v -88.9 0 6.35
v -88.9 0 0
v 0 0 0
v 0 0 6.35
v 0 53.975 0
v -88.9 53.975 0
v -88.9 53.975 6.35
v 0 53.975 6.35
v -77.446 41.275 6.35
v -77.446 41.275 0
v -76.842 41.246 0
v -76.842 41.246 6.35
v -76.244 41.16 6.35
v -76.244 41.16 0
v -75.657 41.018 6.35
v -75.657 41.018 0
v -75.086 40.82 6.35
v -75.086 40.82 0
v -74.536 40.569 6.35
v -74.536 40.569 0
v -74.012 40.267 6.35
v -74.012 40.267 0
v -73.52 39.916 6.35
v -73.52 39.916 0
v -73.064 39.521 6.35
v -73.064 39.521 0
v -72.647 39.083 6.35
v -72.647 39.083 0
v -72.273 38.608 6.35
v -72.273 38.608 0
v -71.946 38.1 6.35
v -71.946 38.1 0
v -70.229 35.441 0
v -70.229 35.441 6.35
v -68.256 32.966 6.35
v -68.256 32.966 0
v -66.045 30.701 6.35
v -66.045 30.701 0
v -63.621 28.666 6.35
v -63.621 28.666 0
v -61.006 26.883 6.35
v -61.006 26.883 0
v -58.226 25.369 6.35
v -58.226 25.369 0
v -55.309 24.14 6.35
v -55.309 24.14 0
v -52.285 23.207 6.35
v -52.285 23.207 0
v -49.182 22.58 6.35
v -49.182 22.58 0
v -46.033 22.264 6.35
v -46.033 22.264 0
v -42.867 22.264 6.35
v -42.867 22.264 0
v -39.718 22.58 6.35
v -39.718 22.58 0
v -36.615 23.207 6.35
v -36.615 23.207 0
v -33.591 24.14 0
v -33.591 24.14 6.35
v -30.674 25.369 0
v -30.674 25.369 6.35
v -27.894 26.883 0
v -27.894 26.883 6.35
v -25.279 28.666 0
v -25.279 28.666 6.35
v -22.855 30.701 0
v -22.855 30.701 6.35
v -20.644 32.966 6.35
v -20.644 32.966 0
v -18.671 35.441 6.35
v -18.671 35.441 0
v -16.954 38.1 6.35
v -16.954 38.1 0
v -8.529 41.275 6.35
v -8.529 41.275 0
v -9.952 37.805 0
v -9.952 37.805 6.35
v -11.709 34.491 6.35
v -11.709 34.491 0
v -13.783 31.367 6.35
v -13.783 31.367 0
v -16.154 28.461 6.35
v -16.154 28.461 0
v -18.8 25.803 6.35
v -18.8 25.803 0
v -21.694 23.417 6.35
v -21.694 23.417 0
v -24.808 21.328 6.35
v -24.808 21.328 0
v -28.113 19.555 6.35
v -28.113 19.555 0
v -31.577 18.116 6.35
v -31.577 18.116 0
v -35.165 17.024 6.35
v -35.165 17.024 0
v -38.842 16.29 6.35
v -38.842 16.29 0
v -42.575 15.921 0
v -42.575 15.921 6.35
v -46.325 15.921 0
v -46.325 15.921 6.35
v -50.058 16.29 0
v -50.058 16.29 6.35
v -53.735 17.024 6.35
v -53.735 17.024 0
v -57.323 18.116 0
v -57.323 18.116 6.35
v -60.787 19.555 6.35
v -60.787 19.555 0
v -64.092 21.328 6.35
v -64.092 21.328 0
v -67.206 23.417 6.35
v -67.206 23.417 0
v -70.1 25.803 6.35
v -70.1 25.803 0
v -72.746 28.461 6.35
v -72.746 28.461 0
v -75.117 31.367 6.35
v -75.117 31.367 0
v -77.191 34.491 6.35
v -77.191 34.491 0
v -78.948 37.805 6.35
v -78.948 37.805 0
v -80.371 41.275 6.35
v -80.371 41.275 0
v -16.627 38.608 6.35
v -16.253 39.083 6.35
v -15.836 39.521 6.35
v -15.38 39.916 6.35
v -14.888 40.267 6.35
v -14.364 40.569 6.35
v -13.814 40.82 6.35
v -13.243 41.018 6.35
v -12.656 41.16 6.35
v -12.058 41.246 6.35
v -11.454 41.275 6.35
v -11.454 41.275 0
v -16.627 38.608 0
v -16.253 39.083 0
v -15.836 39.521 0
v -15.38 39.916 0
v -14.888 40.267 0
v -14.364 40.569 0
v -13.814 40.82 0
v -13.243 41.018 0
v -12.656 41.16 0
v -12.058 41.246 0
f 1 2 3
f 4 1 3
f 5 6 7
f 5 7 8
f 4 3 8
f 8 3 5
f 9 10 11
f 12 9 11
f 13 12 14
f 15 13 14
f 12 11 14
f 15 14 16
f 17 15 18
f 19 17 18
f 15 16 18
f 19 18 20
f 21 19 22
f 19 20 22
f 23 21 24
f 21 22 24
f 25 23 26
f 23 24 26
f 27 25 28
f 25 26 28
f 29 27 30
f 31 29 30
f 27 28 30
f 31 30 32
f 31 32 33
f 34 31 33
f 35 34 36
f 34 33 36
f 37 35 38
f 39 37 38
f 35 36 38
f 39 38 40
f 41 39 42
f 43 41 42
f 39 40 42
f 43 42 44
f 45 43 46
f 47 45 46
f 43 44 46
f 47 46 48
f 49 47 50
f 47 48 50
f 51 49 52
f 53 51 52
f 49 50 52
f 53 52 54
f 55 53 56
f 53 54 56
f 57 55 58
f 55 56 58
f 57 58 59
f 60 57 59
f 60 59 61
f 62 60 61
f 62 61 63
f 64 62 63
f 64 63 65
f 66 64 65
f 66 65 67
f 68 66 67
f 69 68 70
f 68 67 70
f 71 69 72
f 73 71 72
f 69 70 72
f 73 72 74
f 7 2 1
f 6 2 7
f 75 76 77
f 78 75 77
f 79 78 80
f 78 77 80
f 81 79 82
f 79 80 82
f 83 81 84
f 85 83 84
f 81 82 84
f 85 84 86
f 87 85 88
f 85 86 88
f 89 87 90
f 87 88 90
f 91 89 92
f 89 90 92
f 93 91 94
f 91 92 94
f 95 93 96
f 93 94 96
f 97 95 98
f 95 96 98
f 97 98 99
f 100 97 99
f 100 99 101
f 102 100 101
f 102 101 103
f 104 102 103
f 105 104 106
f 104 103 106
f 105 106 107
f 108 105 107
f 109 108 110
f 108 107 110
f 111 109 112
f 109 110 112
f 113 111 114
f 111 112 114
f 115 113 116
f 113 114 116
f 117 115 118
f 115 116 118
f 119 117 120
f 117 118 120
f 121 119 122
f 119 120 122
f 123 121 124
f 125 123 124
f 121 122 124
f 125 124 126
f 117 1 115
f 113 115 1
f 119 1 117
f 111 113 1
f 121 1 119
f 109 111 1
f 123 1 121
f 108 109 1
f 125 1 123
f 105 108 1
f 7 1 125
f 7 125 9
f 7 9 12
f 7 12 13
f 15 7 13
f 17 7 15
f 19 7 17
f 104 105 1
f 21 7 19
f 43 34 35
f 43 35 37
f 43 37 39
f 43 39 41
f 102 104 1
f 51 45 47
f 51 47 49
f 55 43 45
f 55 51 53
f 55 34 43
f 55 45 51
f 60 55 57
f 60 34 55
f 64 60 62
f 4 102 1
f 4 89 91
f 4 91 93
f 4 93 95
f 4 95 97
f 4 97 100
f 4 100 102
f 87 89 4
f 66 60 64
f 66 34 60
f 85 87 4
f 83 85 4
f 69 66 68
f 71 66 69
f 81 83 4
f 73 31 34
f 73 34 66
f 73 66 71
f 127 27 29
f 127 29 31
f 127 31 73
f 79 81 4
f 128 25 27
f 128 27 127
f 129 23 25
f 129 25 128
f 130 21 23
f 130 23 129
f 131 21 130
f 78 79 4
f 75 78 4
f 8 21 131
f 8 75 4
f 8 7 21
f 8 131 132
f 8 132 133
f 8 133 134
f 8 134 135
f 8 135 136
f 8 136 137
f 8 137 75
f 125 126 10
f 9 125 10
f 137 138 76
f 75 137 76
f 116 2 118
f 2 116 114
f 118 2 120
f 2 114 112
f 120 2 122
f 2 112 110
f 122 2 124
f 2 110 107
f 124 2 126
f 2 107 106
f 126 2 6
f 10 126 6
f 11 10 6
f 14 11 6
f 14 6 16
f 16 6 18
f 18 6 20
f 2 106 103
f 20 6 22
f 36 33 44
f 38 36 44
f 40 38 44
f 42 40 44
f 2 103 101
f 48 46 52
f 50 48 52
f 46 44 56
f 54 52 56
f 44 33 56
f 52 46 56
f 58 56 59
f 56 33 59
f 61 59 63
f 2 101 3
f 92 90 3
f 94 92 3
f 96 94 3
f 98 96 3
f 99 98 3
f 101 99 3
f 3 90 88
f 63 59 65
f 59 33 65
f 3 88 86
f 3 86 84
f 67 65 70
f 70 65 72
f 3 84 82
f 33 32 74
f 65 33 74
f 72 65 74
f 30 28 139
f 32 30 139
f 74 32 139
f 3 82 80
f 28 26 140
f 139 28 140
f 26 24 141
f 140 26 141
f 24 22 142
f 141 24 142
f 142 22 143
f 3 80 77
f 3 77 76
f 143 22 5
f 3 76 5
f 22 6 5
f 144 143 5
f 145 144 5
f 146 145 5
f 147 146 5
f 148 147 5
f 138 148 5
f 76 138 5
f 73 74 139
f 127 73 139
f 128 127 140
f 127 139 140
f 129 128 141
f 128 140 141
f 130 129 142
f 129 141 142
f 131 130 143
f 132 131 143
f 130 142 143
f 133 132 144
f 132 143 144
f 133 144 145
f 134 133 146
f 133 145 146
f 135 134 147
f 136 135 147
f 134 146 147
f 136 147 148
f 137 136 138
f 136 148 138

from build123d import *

# Parameters (mm, degrees)
F0_W     = 88.9
F0_H     = 53.975
F1_DEPTH = 6.35


with BuildPart() as f1:
    # F0 (on Top) → F1 (new body)
    with BuildSketch(Plane.XY):
        with Locations((-44.45, 26.9875)):
            Rectangle(F0_W, F0_H)
        with BuildLine():
            ThreePointArc((-77.445568, 41.275), (-74.270568, 40.424261), (-71.946307, 38.1))
            ThreePointArc((-71.946307, 38.1), (-44.45, 22.225), (-16.953693, 38.1))
            ThreePointArc((-16.953693, 38.1), (-14.629432, 40.424261), (-11.454432, 41.275))
            Line((-11.454432, 41.275), (-8.528976, 41.275))
            ThreePointArc((-8.528976, 41.275), (-44.45, 15.875), (-80.371024, 41.275))
            Line((-80.371024, 41.275), (-77.445568, 41.275))
        make_face(mode=Mode.SUBTRACT)
    extrude(amount=F1_DEPTH)


solid = f1.part
